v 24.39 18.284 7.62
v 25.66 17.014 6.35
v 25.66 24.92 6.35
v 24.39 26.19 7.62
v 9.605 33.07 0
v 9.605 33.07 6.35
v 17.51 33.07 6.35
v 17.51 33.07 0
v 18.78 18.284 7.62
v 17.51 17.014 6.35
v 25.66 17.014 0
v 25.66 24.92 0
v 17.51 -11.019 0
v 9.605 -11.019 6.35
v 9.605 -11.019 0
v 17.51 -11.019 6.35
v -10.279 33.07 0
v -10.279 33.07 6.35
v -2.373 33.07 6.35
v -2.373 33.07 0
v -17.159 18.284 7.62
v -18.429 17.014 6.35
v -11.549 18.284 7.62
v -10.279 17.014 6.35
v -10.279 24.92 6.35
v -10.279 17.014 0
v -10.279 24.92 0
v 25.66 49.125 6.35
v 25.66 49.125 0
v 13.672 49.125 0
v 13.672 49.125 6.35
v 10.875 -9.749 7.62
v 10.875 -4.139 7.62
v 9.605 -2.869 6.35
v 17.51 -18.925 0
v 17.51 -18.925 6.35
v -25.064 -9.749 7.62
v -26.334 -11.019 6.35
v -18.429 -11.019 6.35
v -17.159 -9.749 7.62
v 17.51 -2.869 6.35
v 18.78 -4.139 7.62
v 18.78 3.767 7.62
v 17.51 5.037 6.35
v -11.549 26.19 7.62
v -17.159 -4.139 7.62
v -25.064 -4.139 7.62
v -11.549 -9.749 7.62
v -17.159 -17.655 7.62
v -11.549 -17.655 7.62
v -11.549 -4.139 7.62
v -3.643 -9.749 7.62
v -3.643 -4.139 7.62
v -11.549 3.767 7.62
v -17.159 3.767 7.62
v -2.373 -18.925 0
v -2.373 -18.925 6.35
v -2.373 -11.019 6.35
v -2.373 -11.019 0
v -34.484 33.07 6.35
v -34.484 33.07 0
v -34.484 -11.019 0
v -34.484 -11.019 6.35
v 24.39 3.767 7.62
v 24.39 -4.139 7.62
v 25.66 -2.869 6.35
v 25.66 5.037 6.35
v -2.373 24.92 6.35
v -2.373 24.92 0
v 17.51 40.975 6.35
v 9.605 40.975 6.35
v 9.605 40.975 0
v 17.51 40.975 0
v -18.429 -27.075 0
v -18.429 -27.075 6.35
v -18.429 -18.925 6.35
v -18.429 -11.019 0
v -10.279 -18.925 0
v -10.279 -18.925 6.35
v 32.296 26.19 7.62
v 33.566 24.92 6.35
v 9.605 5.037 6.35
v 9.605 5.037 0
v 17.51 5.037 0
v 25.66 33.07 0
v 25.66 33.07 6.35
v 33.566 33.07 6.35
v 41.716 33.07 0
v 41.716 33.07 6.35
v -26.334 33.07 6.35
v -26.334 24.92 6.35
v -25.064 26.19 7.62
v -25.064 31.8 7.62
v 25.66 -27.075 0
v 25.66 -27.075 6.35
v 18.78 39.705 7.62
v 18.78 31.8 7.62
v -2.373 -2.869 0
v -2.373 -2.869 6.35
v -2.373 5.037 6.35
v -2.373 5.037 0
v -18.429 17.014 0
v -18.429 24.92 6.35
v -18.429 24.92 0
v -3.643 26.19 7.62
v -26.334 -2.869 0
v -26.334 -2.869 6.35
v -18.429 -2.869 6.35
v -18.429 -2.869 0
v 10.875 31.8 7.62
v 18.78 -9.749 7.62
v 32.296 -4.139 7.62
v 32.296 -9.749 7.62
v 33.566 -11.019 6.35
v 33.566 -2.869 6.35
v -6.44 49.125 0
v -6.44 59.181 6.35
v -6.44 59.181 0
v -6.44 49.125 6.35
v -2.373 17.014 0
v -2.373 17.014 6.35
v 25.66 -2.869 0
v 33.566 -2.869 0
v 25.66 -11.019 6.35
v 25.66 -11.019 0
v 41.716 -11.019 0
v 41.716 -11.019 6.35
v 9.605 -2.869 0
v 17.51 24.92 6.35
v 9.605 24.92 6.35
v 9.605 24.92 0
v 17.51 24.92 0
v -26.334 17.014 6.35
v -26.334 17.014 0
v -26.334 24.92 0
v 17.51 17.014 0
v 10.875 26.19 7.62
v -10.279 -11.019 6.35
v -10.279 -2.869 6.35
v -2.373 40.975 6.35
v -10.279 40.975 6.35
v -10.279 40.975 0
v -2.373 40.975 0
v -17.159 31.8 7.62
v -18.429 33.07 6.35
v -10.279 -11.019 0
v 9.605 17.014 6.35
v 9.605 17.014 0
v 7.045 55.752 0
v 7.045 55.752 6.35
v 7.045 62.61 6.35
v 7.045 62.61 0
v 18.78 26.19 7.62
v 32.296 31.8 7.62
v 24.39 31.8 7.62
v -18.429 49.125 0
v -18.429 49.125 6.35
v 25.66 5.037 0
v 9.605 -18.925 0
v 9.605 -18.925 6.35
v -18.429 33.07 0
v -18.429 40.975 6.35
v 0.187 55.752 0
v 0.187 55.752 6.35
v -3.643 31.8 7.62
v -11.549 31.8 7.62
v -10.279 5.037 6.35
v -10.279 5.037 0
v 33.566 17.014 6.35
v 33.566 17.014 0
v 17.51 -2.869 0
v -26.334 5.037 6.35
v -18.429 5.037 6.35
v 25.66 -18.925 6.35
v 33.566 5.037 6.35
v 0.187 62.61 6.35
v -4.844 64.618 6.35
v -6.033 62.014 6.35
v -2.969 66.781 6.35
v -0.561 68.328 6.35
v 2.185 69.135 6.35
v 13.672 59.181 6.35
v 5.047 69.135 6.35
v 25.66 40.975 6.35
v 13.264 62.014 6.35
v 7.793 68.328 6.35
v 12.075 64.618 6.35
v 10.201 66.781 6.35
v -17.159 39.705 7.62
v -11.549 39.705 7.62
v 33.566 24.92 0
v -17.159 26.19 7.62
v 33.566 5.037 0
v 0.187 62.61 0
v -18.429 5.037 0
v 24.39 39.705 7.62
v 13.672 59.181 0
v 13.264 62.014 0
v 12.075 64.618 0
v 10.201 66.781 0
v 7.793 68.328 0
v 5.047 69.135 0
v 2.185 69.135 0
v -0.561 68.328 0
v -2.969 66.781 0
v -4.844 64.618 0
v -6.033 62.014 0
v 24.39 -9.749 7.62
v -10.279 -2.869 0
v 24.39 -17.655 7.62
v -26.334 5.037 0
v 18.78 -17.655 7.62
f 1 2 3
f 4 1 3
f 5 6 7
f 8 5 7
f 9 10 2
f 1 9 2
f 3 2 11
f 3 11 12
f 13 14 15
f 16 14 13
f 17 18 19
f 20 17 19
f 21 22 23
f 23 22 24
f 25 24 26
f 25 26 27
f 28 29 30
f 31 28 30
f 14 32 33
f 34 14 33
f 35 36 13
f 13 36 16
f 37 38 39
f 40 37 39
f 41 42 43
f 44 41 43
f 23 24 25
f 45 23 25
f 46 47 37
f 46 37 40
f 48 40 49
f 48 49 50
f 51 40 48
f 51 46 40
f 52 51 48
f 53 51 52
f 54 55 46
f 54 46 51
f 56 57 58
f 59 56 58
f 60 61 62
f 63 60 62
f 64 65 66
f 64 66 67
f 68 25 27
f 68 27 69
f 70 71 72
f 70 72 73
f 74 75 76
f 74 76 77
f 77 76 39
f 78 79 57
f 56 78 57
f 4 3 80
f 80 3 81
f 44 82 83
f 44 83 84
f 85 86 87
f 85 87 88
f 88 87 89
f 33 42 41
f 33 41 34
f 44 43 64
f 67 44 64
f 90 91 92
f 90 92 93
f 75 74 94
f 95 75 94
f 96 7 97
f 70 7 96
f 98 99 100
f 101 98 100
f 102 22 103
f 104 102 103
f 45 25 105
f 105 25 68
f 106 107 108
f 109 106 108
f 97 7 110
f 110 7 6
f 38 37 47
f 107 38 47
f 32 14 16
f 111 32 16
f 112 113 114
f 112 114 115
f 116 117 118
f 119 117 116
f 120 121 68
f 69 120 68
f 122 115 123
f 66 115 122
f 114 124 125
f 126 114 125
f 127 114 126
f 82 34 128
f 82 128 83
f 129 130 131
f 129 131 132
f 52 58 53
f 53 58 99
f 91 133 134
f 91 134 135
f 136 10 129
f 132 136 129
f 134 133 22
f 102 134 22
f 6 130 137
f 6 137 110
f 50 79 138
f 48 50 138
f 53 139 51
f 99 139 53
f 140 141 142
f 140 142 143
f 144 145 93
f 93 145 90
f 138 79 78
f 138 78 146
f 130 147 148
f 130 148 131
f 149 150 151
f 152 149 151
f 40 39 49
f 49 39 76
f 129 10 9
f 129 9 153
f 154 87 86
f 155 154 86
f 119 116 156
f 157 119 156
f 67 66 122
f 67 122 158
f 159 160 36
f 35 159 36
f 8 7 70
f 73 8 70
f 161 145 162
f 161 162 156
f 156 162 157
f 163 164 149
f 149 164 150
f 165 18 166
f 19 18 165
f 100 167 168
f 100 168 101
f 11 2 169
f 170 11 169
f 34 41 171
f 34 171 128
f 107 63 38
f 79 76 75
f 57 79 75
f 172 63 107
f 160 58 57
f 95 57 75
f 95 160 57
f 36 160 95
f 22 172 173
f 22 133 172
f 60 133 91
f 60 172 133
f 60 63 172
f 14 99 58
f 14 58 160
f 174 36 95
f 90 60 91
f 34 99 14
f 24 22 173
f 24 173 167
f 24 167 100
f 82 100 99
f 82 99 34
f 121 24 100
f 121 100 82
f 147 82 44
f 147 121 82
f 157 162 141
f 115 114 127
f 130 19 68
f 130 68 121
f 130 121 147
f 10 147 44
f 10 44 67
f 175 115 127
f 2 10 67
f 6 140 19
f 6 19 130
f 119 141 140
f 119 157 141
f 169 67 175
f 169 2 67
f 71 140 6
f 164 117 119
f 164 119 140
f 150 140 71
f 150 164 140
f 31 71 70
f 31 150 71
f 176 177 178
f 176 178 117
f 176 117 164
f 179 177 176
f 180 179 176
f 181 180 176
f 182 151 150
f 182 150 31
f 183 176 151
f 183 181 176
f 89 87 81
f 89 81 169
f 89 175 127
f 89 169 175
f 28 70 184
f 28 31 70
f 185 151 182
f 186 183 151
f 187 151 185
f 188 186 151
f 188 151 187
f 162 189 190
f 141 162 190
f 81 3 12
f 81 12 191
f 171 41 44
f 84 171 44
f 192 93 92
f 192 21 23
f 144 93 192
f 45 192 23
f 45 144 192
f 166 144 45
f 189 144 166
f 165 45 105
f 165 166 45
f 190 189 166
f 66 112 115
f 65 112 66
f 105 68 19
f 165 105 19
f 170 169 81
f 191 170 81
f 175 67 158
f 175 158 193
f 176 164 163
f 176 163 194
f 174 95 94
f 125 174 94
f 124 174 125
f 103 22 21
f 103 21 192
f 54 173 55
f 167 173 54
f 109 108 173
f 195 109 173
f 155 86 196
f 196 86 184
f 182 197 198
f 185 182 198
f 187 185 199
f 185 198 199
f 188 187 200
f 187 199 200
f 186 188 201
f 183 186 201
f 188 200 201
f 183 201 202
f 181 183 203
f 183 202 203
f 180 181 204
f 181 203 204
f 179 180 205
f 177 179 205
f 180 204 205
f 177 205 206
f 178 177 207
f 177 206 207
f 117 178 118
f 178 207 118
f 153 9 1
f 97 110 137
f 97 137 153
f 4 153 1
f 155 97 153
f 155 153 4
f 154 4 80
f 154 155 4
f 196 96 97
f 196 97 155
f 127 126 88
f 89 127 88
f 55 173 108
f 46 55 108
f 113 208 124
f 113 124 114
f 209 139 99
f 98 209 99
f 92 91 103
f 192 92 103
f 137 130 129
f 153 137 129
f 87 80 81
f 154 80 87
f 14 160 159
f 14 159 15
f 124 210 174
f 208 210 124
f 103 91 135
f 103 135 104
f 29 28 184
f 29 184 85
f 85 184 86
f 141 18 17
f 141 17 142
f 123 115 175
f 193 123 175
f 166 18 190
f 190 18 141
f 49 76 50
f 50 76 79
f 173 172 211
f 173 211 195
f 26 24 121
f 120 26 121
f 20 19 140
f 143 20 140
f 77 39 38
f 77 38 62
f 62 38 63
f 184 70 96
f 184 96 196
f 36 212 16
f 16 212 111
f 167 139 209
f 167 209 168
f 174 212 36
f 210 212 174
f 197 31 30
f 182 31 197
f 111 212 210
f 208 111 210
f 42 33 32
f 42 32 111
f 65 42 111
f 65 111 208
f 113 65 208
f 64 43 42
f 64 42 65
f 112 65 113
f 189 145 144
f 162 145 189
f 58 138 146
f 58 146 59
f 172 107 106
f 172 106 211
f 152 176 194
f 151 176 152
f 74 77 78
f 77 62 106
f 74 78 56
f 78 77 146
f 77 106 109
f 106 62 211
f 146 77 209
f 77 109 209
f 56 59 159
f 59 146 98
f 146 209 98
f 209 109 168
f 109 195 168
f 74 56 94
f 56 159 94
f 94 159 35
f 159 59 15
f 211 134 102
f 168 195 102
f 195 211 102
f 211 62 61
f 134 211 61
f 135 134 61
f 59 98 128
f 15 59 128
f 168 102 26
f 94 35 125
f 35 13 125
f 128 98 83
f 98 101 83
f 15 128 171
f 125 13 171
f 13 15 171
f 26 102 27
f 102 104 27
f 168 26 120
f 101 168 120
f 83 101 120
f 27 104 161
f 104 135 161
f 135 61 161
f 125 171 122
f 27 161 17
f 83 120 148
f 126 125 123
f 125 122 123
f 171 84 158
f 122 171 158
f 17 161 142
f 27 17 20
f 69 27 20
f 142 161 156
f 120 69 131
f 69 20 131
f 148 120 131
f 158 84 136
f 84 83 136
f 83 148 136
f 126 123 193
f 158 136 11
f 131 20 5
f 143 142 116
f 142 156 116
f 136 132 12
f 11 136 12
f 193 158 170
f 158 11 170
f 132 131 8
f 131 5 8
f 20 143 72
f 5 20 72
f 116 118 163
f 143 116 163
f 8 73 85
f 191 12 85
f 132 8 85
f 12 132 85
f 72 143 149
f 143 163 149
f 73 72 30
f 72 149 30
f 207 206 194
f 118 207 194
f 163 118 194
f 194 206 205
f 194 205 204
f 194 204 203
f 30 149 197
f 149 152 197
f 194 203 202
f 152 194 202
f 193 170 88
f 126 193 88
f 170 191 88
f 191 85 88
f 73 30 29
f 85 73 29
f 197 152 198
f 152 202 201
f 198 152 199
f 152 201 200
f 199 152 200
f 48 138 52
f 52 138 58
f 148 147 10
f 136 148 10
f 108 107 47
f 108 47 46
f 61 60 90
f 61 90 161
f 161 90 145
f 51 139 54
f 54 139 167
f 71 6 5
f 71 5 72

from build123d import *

# Parameters (mm, degrees)
F1_DEPTH  = 6.35
F2_W      = 7.9056663411
F2_H      = 7.9056663411
F3_DEPTH  = 25.4
F4_W      = 6.858
F4_H      = 6.858
F5_DEPTH  = 25.4
F6_W      = 7.9056663411
F6_H      = 8.1499283314
F6_W_2    = 8.1499283314
F6_H_2    = 7.9056663411
F7_DEPTH  = 1.27
F8_SIZE   = 1.26999
F10_DEPTH = 6.35


# Not quite as in the source:
# - a fillet or chamfer is up to 0.001 mm smaller than in the source, because OpenCascade refuses the exact size
# - a feature names something its author has since deleted; it is built from what else it names


with BuildPart() as f1:
    # F0 (on Top) → F1 (new body)
    with BuildSketch(Plane.XY):
        with BuildLine():
            ThreePointArc((13.6716806904, 59.1812469065), (-3.4947036843, 66.2917961397), (3.6158455206, 49.1254117533))
            ThreePointArc((3.6158455206, 49.1254117533), (10.7263947587, 52.0706976733), (13.6716806904, 59.1812469065))
        make_face()
    extrude(amount=F1_DEPTH)

    # F4 (on face) → F5 (cut)
    with BuildSketch(Plane.XY.offset(6.35)):
        with Locations((3.6158455372, 59.1812469065)):
            Rectangle(F4_W, F4_H)
    extrude(amount=-F5_DEPTH, mode=Mode.SUBTRACT)



with BuildPart() as f1b:
    # F0 (on Top) → F1, piece 2 (new body)
    with BuildSketch(Plane.XY):
        Polygon((3.6158455206, 49.1254117533), (-34.4841544628, 49.1254117533), (-34.4841544628, -27.0745882467), (41.7158455372, -27.0745882467), (41.7158455372, 49.1254117533), align=None)
    extrude(amount=F1_DEPTH)

    # F2 (on face) → F3 (cut)
    with BuildSketch(Plane.XY.offset(6.35)):
        Polygon((-34.4841544628, 33.0698170808), (-26.3342261314, 33.0698170808), (-18.4285597903, 33.0698170808), (-18.4285597903, 40.9754834219), (-18.4285597903, 49.1254117533), (-34.4841544628, 49.1254117533), align=None)
        Polygon((25.6602508647, 40.9754834219), (25.6602508647, 33.0698170808), (33.5659172058, 33.0698170808), (41.7158455372, 33.0698170808), (41.7158455372, 49.1254117533), (25.6602508647, 49.1254117533), align=None)
        Polygon((33.5659172058, -11.0189935742), (25.6602508647, -11.0189935742), (25.6602508647, -18.9246599153), (25.6602508647, -27.0745882467), (41.7158455372, -27.0745882467), (41.7158455372, -11.0189935742), align=None)
        Polygon((-18.4285597903, -18.9246599153), (-18.4285597903, -11.0189935742), (-26.3342261314, -11.0189935742), (-34.4841544628, -11.0189935742), (-34.4841544628, -27.0745882467), (-18.4285597903, -27.0745882467), align=None)
        with Locations((-22.3813929609, 1.0837679277)):
            Rectangle(F2_W, F2_H)
        with Locations((-22.3813929609, 20.9670555789)):
            Rectangle(F2_W, F2_H)
        with Locations((-6.3257982884, 37.0226502514)):
            Rectangle(F2_W, F2_H)
        with Locations((-6.3257982884, 20.9670555789)):
            Rectangle(F2_W, F2_H)
        with Locations((-6.3257982884, 1.0837679277)):
            Rectangle(F2_W, F2_H)
        with Locations((-6.3257982884, -14.9718267448)):
            Rectangle(F2_W, F2_H)
        with Locations((13.5574893628, -14.9718267448)):
            Rectangle(F2_W, F2_H)
        with Locations((13.5574893628, 1.0837679277)):
            Rectangle(F2_W, F2_H)
        with Locations((29.6130840353, 1.0837679277)):
            Rectangle(F2_W, F2_H)
        with Locations((29.6130840353, 20.9670555789)):
            Rectangle(F2_W, F2_H)
        with Locations((13.5574893628, 20.9670555789)):
            Rectangle(F2_W, F2_H)
        with Locations((13.5574893628, 37.0226502514)):
            Rectangle(F2_W, F2_H)
    extrude(amount=-F3_DEPTH, mode=Mode.SUBTRACT)

    # F6 (on face) → F7 (join, symmetric)
    with BuildSketch(Plane.XY.offset(6.35)):
        with Locations((-22.3813929609, 28.9948529151)):
            Rectangle(F6_W, F6_H)
        with Locations((-14.3535956246, 28.9948529151)):
            Rectangle(F6_W_2, F6_H)
        with Locations((-14.3535956246, 37.0226502514)):
            Rectangle(F6_W_2, F6_H_2)
        with Locations((-6.3257982884, 28.9948529151)):
            Rectangle(F6_W, F6_H)
        with Locations((-14.3535956246, 20.9670555789)):
            Rectangle(F6_W_2, F6_H_2)
        with Locations((13.5574893628, 28.9948529151)):
            Rectangle(F6_W, F6_H)
        with Locations((29.6130840353, 28.9948529151)):
            Rectangle(F6_W, F6_H)
        with Locations((21.585286699, 28.9948529151)):
            Rectangle(F6_W_2, F6_H)
        with Locations((21.585286699, 37.0226502514)):
            Rectangle(F6_W_2, F6_H_2)
        with Locations((21.585286699, 20.9670555789)):
            Rectangle(F6_W_2, F6_H_2)
        with Locations((-14.3535956246, 1.0837679277)):
            Rectangle(F6_W_2, F6_H_2)
        with Locations((-14.3535956246, -6.9440294085)):
            Rectangle(F6_W_2, F6_H)
        with Locations((-14.3535956246, -14.9718267448)):
            Rectangle(F6_W_2, F6_H_2)
        with Locations((-22.3813929609, -6.9440294085)):
            Rectangle(F6_W, F6_H)
        with Locations((-6.3257982884, -6.9440294085)):
            Rectangle(F6_W, F6_H)
        with Locations((13.5574893628, -6.9440294085)):
            Rectangle(F6_W, F6_H)
        with Locations((21.585286699, -6.9440294085)):
            Rectangle(F6_W_2, F6_H)
        with Locations((29.6130840353, -6.9440294085)):
            Rectangle(F6_W, F6_H)
        with Locations((21.585286699, -14.9718267448)):
            Rectangle(F6_W_2, F6_H_2)
        with Locations((21.585286699, 1.0837679277)):
            Rectangle(F6_W_2, F6_H_2)
    extrude(amount=F7_DEPTH, both=True)

    # F8 (size 1.27 in the source; OpenCascade refuses exactly that, so slightly less here)
    f8_edges = [f1b.edges().sort_by_distance(p)[0] for p in [
        (-22.381393, 33.069817, 7.62),
        (-18.42856, 37.02265, 7.62),
        (-14.353596, 40.975483, 7.62),
        (-10.278631, 37.02265, 7.62),
        (-6.325798, 33.069817, 7.62),
        (-2.372965, 28.994853, 7.62),
        (-6.325798, 24.919889, 7.62),
        (-10.278631, 20.967056, 7.62),
        (-14.353596, 17.014222, 7.62),
        (-18.42856, 20.967056, 7.62),
        (-22.381393, 24.919889, 7.62),
        (-26.334226, 28.994853, 7.62),
        (-10.278631, 1.083768, 7.62),
        (-6.325798, -2.869065, 7.62),
        (-2.372965, -6.944029, 7.62),
        (-6.325798, -11.018994, 7.62),
        (-14.353596, -18.92466, 7.62),
        (-26.334226, -6.944029, 7.62),
        (-22.381393, -11.018994, 7.62),
        (-18.42856, -14.971827, 7.62),
        (-22.381393, -2.869065, 7.62),
        (-18.42856, 1.083768, 7.62),
        (-14.353596, 5.036601, 7.62),
        (-10.278631, -14.971827, 7.62),
        (25.660251, 1.083768, 7.62),
        (25.660251, -14.971827, 7.62),
        (21.585287, -18.92466, 7.62),
        (17.510323, -14.971827, 7.62),
        (13.557489, -11.018994, 7.62),
        (9.604656, -6.944029, 7.62),
        (13.557489, -2.869065, 7.62),
        (17.510323, 1.083768, 7.62),
        (21.585287, 5.036601, 7.62),
        (29.613084, -2.869065, 7.62),
        (29.613084, -11.018994, 7.62),
        (33.565917, -6.944029, 7.62),
        (29.613084, 33.069817, 7.62),
        (25.660251, 37.02265, 7.62),
        (21.585287, 40.975483, 7.62),
        (17.510323, 37.02265, 7.62),
        (13.557489, 33.069817, 7.62),
        (9.604656, 28.994853, 7.62),
        (17.510323, 20.967056, 7.62),
        (13.557489, 24.919889, 7.62),
        (21.585287, 17.014222, 7.62),
        (29.613084, 24.919889, 7.62),
        (33.565917, 28.994853, 7.62),
        (25.660251, 20.967056, 7.62),
    ]]
    chamfer(f8_edges, length=F8_SIZE)


with BuildPart() as f1_1:
    add(f1.part)

    add(f1b.part)  # F10 merges F1b
    # F9 (on face) → F10 (join)
    with BuildSketch(Plane.XY.offset(6.35)):
        with BuildLine():
            Line((-6.439989616, 49.1254117533), (3.6158455372, 49.1254117533))
            ThreePointArc((3.6158455372, 49.1254117533), (-3.4947036902, 52.0706976792), (-6.439989616, 59.1812469065))
            Line((-6.439989616, 59.1812469065), (-6.439989616, 49.1254117533))
        make_face()
        with BuildLine():
            Line((3.6158455372, 49.1254117533), (13.6716806904, 49.1254117533))
            Line((13.6716806904, 49.1254117533), (13.6716806904, 59.1812469065))
            ThreePointArc((13.6716806904, 59.1812469065), (10.7263947645, 52.0706976792), (3.6158455372, 49.1254117533))
        make_face()
    extrude(amount=-F10_DEPTH)


solid = f1_1.part
